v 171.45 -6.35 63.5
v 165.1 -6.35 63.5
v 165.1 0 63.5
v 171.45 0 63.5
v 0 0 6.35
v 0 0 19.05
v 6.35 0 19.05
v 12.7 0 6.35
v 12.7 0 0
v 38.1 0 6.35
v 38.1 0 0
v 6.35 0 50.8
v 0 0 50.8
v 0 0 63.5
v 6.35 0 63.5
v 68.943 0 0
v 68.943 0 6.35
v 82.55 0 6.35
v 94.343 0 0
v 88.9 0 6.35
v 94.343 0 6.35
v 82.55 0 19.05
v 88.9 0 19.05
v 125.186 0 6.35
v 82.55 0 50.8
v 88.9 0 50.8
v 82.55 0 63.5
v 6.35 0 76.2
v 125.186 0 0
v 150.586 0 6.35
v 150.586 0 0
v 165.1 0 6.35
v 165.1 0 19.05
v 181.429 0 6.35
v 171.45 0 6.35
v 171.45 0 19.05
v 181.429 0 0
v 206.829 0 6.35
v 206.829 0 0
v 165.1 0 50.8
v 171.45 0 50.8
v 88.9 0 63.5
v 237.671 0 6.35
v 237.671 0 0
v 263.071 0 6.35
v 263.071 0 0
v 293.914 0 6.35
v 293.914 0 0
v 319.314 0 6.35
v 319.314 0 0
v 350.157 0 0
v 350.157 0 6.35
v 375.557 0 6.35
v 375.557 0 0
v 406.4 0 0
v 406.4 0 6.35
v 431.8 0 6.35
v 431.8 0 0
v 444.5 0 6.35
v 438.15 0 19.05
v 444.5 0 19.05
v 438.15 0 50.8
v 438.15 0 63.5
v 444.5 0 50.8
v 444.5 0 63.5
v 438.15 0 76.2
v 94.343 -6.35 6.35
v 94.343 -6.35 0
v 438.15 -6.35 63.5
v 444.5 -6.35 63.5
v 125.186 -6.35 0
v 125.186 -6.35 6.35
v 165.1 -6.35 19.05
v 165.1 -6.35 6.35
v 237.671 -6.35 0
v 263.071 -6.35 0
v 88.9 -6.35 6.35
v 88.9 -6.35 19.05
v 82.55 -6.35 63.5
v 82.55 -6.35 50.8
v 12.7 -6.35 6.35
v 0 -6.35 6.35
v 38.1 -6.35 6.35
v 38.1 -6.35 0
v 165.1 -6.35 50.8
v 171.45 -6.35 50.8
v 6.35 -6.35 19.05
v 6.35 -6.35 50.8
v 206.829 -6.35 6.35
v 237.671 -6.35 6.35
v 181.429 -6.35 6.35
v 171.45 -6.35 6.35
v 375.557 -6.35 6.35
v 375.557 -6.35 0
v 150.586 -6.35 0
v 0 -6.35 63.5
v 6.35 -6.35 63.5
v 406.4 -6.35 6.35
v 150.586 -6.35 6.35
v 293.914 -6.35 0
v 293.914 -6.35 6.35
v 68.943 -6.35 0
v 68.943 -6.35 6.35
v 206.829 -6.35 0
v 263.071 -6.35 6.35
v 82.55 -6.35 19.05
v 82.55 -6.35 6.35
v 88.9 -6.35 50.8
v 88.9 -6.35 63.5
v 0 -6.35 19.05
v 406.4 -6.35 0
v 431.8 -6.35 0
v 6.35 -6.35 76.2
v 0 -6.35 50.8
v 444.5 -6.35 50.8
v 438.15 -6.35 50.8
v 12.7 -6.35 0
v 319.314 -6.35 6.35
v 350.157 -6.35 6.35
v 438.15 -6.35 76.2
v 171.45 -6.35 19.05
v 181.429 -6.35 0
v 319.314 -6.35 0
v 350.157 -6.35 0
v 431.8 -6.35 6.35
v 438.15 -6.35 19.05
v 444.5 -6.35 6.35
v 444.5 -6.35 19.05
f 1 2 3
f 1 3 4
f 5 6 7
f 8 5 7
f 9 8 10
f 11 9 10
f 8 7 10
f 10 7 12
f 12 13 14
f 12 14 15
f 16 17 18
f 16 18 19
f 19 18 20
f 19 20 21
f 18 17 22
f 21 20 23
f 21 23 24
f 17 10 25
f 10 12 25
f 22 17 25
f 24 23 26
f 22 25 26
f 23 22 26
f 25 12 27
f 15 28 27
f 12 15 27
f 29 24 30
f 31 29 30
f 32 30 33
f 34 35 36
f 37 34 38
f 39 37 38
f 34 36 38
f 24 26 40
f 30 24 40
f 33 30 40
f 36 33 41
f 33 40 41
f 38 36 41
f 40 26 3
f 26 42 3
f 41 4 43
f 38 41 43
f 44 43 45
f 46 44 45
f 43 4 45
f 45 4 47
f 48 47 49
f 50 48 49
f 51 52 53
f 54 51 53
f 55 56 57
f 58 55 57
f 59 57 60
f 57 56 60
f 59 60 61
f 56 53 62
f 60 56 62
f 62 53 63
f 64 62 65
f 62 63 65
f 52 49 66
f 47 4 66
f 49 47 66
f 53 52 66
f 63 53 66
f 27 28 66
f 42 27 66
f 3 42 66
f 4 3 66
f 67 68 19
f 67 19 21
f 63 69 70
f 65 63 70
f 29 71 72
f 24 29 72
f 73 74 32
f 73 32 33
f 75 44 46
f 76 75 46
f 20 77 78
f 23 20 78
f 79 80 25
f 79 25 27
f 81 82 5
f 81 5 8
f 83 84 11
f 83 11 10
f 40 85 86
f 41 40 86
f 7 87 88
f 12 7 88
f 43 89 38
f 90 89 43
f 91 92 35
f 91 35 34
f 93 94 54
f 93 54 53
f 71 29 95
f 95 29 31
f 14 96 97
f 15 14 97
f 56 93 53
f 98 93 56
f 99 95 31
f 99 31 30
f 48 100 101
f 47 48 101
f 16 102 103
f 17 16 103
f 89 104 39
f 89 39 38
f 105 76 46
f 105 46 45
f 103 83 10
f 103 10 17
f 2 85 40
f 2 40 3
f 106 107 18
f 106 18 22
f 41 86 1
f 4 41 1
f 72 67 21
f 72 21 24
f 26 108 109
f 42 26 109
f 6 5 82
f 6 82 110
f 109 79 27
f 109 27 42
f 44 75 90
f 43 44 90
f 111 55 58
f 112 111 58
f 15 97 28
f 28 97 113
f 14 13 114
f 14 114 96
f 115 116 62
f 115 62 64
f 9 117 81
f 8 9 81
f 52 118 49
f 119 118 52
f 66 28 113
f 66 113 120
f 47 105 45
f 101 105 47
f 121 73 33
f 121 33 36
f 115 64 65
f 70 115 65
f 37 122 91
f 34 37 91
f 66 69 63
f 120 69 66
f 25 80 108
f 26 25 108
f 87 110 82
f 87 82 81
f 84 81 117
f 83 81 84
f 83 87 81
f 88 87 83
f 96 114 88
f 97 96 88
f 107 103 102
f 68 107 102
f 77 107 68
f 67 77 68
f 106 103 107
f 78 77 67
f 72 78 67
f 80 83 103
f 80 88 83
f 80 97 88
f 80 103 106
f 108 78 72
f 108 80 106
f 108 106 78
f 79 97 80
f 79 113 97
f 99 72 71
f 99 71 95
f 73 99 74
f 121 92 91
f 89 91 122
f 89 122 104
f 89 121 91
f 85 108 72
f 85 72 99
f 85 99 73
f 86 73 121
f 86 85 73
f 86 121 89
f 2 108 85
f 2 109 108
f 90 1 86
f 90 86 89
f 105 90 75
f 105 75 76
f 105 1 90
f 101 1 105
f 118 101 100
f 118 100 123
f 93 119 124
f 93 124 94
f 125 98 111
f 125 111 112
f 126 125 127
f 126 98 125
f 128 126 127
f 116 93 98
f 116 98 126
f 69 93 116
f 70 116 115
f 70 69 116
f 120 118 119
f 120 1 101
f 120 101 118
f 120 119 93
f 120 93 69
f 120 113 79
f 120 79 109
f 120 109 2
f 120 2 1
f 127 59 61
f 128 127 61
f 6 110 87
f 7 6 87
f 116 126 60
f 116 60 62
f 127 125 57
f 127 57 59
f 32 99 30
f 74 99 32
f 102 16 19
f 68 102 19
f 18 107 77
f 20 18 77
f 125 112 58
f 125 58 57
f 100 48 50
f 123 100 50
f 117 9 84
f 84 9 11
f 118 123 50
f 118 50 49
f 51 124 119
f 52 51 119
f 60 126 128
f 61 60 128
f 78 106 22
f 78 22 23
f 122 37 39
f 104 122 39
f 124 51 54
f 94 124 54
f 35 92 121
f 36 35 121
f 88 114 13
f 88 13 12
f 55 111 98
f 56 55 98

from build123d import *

# Parameters (mm, degrees)
F0_W     = 444.5
F0_H     = 76.2
F1_DEPTH = 6.35
F2_W     = 6.35
F2_H     = 6.35
F2_H_2   = 12.7
F2_H_3   = 31.75
F3_DEPTH = 6.35
F4_W     = 30.842857
F4_H     = 6.35
F4_W_2   = 30.842858
F4_W_3   = 6.35
F5_DEPTH = 6.351
F6_W     = 6.35
F6_H     = 12.7
F7_DEPTH = 6.351


with BuildPart() as f1:
    # F0 (on Front) → F1 (new body)
    with BuildSketch(Plane.XZ):
        with Locations((222.25, 38.1)):
            Rectangle(F0_W, F0_H)
    extrude(amount=F1_DEPTH)

    # F2 (on face) → F3 (cut, through all)
    with BuildSketch(Plane.XZ.offset(6.35)):
        with Locations((3.175, 3.175)):
            Rectangle(F2_W, F2_H)
        with Locations((3.175, 69.85)):
            Rectangle(F2_W, F2_H_2)
        with Locations((3.175, 34.925)):
            Rectangle(F2_W, F2_H_3)
        with Locations((441.325, 3.175)):
            Rectangle(F2_W, F2_H)
        with Locations((441.325, 34.925)):
            Rectangle(F2_W, F2_H_3)
        with Locations((441.325, 69.85)):
            Rectangle(F2_W, F2_H_2)
    extrude(amount=-F3_DEPTH, mode=Mode.SUBTRACT)

    # F4 (on face) → F5 (cut, through all)
    with BuildSketch(Plane.XZ.offset(6.35)):
        with Locations((53.521428, 3.175)):
            Rectangle(F4_W, F4_H)
        with Locations((109.764285, 3.175)):
            Rectangle(F4_W, F4_H)
        with Locations((166.007142, 3.175)):
            Rectangle(F4_W, F4_H)
        with Locations((222.25, 3.175)):
            Rectangle(F4_W_2, F4_H)
        with Locations((278.492858, 3.175)):
            Rectangle(F4_W, F4_H)
        with Locations((334.735714, 3.175)):
            Rectangle(F4_W, F4_H)
        with Locations((390.978571, 3.175)):
            Rectangle(F4_W, F4_H)
        with Locations((9.525, 3.175)):
            Rectangle(F4_W_3, F4_H)
        with Locations((434.975, 3.175)):
            Rectangle(F4_W_3, F4_H)
    extrude(amount=-F5_DEPTH, mode=Mode.SUBTRACT)

    # F6 (on face) → F7 (cut, through all)
    with BuildSketch(Plane.XZ.offset(6.35)):
        with Locations((85.725, 12.7)):
            Rectangle(F6_W, F6_H)
        with Locations((85.725, 57.15)):
            Rectangle(F6_W, F6_H)
        with Locations((168.275, 12.7)):
            Rectangle(F6_W, F6_H)
        with Locations((168.275, 57.15)):
            Rectangle(F6_W, F6_H)
    extrude(amount=-F7_DEPTH, mode=Mode.SUBTRACT)


solid = f1.part
